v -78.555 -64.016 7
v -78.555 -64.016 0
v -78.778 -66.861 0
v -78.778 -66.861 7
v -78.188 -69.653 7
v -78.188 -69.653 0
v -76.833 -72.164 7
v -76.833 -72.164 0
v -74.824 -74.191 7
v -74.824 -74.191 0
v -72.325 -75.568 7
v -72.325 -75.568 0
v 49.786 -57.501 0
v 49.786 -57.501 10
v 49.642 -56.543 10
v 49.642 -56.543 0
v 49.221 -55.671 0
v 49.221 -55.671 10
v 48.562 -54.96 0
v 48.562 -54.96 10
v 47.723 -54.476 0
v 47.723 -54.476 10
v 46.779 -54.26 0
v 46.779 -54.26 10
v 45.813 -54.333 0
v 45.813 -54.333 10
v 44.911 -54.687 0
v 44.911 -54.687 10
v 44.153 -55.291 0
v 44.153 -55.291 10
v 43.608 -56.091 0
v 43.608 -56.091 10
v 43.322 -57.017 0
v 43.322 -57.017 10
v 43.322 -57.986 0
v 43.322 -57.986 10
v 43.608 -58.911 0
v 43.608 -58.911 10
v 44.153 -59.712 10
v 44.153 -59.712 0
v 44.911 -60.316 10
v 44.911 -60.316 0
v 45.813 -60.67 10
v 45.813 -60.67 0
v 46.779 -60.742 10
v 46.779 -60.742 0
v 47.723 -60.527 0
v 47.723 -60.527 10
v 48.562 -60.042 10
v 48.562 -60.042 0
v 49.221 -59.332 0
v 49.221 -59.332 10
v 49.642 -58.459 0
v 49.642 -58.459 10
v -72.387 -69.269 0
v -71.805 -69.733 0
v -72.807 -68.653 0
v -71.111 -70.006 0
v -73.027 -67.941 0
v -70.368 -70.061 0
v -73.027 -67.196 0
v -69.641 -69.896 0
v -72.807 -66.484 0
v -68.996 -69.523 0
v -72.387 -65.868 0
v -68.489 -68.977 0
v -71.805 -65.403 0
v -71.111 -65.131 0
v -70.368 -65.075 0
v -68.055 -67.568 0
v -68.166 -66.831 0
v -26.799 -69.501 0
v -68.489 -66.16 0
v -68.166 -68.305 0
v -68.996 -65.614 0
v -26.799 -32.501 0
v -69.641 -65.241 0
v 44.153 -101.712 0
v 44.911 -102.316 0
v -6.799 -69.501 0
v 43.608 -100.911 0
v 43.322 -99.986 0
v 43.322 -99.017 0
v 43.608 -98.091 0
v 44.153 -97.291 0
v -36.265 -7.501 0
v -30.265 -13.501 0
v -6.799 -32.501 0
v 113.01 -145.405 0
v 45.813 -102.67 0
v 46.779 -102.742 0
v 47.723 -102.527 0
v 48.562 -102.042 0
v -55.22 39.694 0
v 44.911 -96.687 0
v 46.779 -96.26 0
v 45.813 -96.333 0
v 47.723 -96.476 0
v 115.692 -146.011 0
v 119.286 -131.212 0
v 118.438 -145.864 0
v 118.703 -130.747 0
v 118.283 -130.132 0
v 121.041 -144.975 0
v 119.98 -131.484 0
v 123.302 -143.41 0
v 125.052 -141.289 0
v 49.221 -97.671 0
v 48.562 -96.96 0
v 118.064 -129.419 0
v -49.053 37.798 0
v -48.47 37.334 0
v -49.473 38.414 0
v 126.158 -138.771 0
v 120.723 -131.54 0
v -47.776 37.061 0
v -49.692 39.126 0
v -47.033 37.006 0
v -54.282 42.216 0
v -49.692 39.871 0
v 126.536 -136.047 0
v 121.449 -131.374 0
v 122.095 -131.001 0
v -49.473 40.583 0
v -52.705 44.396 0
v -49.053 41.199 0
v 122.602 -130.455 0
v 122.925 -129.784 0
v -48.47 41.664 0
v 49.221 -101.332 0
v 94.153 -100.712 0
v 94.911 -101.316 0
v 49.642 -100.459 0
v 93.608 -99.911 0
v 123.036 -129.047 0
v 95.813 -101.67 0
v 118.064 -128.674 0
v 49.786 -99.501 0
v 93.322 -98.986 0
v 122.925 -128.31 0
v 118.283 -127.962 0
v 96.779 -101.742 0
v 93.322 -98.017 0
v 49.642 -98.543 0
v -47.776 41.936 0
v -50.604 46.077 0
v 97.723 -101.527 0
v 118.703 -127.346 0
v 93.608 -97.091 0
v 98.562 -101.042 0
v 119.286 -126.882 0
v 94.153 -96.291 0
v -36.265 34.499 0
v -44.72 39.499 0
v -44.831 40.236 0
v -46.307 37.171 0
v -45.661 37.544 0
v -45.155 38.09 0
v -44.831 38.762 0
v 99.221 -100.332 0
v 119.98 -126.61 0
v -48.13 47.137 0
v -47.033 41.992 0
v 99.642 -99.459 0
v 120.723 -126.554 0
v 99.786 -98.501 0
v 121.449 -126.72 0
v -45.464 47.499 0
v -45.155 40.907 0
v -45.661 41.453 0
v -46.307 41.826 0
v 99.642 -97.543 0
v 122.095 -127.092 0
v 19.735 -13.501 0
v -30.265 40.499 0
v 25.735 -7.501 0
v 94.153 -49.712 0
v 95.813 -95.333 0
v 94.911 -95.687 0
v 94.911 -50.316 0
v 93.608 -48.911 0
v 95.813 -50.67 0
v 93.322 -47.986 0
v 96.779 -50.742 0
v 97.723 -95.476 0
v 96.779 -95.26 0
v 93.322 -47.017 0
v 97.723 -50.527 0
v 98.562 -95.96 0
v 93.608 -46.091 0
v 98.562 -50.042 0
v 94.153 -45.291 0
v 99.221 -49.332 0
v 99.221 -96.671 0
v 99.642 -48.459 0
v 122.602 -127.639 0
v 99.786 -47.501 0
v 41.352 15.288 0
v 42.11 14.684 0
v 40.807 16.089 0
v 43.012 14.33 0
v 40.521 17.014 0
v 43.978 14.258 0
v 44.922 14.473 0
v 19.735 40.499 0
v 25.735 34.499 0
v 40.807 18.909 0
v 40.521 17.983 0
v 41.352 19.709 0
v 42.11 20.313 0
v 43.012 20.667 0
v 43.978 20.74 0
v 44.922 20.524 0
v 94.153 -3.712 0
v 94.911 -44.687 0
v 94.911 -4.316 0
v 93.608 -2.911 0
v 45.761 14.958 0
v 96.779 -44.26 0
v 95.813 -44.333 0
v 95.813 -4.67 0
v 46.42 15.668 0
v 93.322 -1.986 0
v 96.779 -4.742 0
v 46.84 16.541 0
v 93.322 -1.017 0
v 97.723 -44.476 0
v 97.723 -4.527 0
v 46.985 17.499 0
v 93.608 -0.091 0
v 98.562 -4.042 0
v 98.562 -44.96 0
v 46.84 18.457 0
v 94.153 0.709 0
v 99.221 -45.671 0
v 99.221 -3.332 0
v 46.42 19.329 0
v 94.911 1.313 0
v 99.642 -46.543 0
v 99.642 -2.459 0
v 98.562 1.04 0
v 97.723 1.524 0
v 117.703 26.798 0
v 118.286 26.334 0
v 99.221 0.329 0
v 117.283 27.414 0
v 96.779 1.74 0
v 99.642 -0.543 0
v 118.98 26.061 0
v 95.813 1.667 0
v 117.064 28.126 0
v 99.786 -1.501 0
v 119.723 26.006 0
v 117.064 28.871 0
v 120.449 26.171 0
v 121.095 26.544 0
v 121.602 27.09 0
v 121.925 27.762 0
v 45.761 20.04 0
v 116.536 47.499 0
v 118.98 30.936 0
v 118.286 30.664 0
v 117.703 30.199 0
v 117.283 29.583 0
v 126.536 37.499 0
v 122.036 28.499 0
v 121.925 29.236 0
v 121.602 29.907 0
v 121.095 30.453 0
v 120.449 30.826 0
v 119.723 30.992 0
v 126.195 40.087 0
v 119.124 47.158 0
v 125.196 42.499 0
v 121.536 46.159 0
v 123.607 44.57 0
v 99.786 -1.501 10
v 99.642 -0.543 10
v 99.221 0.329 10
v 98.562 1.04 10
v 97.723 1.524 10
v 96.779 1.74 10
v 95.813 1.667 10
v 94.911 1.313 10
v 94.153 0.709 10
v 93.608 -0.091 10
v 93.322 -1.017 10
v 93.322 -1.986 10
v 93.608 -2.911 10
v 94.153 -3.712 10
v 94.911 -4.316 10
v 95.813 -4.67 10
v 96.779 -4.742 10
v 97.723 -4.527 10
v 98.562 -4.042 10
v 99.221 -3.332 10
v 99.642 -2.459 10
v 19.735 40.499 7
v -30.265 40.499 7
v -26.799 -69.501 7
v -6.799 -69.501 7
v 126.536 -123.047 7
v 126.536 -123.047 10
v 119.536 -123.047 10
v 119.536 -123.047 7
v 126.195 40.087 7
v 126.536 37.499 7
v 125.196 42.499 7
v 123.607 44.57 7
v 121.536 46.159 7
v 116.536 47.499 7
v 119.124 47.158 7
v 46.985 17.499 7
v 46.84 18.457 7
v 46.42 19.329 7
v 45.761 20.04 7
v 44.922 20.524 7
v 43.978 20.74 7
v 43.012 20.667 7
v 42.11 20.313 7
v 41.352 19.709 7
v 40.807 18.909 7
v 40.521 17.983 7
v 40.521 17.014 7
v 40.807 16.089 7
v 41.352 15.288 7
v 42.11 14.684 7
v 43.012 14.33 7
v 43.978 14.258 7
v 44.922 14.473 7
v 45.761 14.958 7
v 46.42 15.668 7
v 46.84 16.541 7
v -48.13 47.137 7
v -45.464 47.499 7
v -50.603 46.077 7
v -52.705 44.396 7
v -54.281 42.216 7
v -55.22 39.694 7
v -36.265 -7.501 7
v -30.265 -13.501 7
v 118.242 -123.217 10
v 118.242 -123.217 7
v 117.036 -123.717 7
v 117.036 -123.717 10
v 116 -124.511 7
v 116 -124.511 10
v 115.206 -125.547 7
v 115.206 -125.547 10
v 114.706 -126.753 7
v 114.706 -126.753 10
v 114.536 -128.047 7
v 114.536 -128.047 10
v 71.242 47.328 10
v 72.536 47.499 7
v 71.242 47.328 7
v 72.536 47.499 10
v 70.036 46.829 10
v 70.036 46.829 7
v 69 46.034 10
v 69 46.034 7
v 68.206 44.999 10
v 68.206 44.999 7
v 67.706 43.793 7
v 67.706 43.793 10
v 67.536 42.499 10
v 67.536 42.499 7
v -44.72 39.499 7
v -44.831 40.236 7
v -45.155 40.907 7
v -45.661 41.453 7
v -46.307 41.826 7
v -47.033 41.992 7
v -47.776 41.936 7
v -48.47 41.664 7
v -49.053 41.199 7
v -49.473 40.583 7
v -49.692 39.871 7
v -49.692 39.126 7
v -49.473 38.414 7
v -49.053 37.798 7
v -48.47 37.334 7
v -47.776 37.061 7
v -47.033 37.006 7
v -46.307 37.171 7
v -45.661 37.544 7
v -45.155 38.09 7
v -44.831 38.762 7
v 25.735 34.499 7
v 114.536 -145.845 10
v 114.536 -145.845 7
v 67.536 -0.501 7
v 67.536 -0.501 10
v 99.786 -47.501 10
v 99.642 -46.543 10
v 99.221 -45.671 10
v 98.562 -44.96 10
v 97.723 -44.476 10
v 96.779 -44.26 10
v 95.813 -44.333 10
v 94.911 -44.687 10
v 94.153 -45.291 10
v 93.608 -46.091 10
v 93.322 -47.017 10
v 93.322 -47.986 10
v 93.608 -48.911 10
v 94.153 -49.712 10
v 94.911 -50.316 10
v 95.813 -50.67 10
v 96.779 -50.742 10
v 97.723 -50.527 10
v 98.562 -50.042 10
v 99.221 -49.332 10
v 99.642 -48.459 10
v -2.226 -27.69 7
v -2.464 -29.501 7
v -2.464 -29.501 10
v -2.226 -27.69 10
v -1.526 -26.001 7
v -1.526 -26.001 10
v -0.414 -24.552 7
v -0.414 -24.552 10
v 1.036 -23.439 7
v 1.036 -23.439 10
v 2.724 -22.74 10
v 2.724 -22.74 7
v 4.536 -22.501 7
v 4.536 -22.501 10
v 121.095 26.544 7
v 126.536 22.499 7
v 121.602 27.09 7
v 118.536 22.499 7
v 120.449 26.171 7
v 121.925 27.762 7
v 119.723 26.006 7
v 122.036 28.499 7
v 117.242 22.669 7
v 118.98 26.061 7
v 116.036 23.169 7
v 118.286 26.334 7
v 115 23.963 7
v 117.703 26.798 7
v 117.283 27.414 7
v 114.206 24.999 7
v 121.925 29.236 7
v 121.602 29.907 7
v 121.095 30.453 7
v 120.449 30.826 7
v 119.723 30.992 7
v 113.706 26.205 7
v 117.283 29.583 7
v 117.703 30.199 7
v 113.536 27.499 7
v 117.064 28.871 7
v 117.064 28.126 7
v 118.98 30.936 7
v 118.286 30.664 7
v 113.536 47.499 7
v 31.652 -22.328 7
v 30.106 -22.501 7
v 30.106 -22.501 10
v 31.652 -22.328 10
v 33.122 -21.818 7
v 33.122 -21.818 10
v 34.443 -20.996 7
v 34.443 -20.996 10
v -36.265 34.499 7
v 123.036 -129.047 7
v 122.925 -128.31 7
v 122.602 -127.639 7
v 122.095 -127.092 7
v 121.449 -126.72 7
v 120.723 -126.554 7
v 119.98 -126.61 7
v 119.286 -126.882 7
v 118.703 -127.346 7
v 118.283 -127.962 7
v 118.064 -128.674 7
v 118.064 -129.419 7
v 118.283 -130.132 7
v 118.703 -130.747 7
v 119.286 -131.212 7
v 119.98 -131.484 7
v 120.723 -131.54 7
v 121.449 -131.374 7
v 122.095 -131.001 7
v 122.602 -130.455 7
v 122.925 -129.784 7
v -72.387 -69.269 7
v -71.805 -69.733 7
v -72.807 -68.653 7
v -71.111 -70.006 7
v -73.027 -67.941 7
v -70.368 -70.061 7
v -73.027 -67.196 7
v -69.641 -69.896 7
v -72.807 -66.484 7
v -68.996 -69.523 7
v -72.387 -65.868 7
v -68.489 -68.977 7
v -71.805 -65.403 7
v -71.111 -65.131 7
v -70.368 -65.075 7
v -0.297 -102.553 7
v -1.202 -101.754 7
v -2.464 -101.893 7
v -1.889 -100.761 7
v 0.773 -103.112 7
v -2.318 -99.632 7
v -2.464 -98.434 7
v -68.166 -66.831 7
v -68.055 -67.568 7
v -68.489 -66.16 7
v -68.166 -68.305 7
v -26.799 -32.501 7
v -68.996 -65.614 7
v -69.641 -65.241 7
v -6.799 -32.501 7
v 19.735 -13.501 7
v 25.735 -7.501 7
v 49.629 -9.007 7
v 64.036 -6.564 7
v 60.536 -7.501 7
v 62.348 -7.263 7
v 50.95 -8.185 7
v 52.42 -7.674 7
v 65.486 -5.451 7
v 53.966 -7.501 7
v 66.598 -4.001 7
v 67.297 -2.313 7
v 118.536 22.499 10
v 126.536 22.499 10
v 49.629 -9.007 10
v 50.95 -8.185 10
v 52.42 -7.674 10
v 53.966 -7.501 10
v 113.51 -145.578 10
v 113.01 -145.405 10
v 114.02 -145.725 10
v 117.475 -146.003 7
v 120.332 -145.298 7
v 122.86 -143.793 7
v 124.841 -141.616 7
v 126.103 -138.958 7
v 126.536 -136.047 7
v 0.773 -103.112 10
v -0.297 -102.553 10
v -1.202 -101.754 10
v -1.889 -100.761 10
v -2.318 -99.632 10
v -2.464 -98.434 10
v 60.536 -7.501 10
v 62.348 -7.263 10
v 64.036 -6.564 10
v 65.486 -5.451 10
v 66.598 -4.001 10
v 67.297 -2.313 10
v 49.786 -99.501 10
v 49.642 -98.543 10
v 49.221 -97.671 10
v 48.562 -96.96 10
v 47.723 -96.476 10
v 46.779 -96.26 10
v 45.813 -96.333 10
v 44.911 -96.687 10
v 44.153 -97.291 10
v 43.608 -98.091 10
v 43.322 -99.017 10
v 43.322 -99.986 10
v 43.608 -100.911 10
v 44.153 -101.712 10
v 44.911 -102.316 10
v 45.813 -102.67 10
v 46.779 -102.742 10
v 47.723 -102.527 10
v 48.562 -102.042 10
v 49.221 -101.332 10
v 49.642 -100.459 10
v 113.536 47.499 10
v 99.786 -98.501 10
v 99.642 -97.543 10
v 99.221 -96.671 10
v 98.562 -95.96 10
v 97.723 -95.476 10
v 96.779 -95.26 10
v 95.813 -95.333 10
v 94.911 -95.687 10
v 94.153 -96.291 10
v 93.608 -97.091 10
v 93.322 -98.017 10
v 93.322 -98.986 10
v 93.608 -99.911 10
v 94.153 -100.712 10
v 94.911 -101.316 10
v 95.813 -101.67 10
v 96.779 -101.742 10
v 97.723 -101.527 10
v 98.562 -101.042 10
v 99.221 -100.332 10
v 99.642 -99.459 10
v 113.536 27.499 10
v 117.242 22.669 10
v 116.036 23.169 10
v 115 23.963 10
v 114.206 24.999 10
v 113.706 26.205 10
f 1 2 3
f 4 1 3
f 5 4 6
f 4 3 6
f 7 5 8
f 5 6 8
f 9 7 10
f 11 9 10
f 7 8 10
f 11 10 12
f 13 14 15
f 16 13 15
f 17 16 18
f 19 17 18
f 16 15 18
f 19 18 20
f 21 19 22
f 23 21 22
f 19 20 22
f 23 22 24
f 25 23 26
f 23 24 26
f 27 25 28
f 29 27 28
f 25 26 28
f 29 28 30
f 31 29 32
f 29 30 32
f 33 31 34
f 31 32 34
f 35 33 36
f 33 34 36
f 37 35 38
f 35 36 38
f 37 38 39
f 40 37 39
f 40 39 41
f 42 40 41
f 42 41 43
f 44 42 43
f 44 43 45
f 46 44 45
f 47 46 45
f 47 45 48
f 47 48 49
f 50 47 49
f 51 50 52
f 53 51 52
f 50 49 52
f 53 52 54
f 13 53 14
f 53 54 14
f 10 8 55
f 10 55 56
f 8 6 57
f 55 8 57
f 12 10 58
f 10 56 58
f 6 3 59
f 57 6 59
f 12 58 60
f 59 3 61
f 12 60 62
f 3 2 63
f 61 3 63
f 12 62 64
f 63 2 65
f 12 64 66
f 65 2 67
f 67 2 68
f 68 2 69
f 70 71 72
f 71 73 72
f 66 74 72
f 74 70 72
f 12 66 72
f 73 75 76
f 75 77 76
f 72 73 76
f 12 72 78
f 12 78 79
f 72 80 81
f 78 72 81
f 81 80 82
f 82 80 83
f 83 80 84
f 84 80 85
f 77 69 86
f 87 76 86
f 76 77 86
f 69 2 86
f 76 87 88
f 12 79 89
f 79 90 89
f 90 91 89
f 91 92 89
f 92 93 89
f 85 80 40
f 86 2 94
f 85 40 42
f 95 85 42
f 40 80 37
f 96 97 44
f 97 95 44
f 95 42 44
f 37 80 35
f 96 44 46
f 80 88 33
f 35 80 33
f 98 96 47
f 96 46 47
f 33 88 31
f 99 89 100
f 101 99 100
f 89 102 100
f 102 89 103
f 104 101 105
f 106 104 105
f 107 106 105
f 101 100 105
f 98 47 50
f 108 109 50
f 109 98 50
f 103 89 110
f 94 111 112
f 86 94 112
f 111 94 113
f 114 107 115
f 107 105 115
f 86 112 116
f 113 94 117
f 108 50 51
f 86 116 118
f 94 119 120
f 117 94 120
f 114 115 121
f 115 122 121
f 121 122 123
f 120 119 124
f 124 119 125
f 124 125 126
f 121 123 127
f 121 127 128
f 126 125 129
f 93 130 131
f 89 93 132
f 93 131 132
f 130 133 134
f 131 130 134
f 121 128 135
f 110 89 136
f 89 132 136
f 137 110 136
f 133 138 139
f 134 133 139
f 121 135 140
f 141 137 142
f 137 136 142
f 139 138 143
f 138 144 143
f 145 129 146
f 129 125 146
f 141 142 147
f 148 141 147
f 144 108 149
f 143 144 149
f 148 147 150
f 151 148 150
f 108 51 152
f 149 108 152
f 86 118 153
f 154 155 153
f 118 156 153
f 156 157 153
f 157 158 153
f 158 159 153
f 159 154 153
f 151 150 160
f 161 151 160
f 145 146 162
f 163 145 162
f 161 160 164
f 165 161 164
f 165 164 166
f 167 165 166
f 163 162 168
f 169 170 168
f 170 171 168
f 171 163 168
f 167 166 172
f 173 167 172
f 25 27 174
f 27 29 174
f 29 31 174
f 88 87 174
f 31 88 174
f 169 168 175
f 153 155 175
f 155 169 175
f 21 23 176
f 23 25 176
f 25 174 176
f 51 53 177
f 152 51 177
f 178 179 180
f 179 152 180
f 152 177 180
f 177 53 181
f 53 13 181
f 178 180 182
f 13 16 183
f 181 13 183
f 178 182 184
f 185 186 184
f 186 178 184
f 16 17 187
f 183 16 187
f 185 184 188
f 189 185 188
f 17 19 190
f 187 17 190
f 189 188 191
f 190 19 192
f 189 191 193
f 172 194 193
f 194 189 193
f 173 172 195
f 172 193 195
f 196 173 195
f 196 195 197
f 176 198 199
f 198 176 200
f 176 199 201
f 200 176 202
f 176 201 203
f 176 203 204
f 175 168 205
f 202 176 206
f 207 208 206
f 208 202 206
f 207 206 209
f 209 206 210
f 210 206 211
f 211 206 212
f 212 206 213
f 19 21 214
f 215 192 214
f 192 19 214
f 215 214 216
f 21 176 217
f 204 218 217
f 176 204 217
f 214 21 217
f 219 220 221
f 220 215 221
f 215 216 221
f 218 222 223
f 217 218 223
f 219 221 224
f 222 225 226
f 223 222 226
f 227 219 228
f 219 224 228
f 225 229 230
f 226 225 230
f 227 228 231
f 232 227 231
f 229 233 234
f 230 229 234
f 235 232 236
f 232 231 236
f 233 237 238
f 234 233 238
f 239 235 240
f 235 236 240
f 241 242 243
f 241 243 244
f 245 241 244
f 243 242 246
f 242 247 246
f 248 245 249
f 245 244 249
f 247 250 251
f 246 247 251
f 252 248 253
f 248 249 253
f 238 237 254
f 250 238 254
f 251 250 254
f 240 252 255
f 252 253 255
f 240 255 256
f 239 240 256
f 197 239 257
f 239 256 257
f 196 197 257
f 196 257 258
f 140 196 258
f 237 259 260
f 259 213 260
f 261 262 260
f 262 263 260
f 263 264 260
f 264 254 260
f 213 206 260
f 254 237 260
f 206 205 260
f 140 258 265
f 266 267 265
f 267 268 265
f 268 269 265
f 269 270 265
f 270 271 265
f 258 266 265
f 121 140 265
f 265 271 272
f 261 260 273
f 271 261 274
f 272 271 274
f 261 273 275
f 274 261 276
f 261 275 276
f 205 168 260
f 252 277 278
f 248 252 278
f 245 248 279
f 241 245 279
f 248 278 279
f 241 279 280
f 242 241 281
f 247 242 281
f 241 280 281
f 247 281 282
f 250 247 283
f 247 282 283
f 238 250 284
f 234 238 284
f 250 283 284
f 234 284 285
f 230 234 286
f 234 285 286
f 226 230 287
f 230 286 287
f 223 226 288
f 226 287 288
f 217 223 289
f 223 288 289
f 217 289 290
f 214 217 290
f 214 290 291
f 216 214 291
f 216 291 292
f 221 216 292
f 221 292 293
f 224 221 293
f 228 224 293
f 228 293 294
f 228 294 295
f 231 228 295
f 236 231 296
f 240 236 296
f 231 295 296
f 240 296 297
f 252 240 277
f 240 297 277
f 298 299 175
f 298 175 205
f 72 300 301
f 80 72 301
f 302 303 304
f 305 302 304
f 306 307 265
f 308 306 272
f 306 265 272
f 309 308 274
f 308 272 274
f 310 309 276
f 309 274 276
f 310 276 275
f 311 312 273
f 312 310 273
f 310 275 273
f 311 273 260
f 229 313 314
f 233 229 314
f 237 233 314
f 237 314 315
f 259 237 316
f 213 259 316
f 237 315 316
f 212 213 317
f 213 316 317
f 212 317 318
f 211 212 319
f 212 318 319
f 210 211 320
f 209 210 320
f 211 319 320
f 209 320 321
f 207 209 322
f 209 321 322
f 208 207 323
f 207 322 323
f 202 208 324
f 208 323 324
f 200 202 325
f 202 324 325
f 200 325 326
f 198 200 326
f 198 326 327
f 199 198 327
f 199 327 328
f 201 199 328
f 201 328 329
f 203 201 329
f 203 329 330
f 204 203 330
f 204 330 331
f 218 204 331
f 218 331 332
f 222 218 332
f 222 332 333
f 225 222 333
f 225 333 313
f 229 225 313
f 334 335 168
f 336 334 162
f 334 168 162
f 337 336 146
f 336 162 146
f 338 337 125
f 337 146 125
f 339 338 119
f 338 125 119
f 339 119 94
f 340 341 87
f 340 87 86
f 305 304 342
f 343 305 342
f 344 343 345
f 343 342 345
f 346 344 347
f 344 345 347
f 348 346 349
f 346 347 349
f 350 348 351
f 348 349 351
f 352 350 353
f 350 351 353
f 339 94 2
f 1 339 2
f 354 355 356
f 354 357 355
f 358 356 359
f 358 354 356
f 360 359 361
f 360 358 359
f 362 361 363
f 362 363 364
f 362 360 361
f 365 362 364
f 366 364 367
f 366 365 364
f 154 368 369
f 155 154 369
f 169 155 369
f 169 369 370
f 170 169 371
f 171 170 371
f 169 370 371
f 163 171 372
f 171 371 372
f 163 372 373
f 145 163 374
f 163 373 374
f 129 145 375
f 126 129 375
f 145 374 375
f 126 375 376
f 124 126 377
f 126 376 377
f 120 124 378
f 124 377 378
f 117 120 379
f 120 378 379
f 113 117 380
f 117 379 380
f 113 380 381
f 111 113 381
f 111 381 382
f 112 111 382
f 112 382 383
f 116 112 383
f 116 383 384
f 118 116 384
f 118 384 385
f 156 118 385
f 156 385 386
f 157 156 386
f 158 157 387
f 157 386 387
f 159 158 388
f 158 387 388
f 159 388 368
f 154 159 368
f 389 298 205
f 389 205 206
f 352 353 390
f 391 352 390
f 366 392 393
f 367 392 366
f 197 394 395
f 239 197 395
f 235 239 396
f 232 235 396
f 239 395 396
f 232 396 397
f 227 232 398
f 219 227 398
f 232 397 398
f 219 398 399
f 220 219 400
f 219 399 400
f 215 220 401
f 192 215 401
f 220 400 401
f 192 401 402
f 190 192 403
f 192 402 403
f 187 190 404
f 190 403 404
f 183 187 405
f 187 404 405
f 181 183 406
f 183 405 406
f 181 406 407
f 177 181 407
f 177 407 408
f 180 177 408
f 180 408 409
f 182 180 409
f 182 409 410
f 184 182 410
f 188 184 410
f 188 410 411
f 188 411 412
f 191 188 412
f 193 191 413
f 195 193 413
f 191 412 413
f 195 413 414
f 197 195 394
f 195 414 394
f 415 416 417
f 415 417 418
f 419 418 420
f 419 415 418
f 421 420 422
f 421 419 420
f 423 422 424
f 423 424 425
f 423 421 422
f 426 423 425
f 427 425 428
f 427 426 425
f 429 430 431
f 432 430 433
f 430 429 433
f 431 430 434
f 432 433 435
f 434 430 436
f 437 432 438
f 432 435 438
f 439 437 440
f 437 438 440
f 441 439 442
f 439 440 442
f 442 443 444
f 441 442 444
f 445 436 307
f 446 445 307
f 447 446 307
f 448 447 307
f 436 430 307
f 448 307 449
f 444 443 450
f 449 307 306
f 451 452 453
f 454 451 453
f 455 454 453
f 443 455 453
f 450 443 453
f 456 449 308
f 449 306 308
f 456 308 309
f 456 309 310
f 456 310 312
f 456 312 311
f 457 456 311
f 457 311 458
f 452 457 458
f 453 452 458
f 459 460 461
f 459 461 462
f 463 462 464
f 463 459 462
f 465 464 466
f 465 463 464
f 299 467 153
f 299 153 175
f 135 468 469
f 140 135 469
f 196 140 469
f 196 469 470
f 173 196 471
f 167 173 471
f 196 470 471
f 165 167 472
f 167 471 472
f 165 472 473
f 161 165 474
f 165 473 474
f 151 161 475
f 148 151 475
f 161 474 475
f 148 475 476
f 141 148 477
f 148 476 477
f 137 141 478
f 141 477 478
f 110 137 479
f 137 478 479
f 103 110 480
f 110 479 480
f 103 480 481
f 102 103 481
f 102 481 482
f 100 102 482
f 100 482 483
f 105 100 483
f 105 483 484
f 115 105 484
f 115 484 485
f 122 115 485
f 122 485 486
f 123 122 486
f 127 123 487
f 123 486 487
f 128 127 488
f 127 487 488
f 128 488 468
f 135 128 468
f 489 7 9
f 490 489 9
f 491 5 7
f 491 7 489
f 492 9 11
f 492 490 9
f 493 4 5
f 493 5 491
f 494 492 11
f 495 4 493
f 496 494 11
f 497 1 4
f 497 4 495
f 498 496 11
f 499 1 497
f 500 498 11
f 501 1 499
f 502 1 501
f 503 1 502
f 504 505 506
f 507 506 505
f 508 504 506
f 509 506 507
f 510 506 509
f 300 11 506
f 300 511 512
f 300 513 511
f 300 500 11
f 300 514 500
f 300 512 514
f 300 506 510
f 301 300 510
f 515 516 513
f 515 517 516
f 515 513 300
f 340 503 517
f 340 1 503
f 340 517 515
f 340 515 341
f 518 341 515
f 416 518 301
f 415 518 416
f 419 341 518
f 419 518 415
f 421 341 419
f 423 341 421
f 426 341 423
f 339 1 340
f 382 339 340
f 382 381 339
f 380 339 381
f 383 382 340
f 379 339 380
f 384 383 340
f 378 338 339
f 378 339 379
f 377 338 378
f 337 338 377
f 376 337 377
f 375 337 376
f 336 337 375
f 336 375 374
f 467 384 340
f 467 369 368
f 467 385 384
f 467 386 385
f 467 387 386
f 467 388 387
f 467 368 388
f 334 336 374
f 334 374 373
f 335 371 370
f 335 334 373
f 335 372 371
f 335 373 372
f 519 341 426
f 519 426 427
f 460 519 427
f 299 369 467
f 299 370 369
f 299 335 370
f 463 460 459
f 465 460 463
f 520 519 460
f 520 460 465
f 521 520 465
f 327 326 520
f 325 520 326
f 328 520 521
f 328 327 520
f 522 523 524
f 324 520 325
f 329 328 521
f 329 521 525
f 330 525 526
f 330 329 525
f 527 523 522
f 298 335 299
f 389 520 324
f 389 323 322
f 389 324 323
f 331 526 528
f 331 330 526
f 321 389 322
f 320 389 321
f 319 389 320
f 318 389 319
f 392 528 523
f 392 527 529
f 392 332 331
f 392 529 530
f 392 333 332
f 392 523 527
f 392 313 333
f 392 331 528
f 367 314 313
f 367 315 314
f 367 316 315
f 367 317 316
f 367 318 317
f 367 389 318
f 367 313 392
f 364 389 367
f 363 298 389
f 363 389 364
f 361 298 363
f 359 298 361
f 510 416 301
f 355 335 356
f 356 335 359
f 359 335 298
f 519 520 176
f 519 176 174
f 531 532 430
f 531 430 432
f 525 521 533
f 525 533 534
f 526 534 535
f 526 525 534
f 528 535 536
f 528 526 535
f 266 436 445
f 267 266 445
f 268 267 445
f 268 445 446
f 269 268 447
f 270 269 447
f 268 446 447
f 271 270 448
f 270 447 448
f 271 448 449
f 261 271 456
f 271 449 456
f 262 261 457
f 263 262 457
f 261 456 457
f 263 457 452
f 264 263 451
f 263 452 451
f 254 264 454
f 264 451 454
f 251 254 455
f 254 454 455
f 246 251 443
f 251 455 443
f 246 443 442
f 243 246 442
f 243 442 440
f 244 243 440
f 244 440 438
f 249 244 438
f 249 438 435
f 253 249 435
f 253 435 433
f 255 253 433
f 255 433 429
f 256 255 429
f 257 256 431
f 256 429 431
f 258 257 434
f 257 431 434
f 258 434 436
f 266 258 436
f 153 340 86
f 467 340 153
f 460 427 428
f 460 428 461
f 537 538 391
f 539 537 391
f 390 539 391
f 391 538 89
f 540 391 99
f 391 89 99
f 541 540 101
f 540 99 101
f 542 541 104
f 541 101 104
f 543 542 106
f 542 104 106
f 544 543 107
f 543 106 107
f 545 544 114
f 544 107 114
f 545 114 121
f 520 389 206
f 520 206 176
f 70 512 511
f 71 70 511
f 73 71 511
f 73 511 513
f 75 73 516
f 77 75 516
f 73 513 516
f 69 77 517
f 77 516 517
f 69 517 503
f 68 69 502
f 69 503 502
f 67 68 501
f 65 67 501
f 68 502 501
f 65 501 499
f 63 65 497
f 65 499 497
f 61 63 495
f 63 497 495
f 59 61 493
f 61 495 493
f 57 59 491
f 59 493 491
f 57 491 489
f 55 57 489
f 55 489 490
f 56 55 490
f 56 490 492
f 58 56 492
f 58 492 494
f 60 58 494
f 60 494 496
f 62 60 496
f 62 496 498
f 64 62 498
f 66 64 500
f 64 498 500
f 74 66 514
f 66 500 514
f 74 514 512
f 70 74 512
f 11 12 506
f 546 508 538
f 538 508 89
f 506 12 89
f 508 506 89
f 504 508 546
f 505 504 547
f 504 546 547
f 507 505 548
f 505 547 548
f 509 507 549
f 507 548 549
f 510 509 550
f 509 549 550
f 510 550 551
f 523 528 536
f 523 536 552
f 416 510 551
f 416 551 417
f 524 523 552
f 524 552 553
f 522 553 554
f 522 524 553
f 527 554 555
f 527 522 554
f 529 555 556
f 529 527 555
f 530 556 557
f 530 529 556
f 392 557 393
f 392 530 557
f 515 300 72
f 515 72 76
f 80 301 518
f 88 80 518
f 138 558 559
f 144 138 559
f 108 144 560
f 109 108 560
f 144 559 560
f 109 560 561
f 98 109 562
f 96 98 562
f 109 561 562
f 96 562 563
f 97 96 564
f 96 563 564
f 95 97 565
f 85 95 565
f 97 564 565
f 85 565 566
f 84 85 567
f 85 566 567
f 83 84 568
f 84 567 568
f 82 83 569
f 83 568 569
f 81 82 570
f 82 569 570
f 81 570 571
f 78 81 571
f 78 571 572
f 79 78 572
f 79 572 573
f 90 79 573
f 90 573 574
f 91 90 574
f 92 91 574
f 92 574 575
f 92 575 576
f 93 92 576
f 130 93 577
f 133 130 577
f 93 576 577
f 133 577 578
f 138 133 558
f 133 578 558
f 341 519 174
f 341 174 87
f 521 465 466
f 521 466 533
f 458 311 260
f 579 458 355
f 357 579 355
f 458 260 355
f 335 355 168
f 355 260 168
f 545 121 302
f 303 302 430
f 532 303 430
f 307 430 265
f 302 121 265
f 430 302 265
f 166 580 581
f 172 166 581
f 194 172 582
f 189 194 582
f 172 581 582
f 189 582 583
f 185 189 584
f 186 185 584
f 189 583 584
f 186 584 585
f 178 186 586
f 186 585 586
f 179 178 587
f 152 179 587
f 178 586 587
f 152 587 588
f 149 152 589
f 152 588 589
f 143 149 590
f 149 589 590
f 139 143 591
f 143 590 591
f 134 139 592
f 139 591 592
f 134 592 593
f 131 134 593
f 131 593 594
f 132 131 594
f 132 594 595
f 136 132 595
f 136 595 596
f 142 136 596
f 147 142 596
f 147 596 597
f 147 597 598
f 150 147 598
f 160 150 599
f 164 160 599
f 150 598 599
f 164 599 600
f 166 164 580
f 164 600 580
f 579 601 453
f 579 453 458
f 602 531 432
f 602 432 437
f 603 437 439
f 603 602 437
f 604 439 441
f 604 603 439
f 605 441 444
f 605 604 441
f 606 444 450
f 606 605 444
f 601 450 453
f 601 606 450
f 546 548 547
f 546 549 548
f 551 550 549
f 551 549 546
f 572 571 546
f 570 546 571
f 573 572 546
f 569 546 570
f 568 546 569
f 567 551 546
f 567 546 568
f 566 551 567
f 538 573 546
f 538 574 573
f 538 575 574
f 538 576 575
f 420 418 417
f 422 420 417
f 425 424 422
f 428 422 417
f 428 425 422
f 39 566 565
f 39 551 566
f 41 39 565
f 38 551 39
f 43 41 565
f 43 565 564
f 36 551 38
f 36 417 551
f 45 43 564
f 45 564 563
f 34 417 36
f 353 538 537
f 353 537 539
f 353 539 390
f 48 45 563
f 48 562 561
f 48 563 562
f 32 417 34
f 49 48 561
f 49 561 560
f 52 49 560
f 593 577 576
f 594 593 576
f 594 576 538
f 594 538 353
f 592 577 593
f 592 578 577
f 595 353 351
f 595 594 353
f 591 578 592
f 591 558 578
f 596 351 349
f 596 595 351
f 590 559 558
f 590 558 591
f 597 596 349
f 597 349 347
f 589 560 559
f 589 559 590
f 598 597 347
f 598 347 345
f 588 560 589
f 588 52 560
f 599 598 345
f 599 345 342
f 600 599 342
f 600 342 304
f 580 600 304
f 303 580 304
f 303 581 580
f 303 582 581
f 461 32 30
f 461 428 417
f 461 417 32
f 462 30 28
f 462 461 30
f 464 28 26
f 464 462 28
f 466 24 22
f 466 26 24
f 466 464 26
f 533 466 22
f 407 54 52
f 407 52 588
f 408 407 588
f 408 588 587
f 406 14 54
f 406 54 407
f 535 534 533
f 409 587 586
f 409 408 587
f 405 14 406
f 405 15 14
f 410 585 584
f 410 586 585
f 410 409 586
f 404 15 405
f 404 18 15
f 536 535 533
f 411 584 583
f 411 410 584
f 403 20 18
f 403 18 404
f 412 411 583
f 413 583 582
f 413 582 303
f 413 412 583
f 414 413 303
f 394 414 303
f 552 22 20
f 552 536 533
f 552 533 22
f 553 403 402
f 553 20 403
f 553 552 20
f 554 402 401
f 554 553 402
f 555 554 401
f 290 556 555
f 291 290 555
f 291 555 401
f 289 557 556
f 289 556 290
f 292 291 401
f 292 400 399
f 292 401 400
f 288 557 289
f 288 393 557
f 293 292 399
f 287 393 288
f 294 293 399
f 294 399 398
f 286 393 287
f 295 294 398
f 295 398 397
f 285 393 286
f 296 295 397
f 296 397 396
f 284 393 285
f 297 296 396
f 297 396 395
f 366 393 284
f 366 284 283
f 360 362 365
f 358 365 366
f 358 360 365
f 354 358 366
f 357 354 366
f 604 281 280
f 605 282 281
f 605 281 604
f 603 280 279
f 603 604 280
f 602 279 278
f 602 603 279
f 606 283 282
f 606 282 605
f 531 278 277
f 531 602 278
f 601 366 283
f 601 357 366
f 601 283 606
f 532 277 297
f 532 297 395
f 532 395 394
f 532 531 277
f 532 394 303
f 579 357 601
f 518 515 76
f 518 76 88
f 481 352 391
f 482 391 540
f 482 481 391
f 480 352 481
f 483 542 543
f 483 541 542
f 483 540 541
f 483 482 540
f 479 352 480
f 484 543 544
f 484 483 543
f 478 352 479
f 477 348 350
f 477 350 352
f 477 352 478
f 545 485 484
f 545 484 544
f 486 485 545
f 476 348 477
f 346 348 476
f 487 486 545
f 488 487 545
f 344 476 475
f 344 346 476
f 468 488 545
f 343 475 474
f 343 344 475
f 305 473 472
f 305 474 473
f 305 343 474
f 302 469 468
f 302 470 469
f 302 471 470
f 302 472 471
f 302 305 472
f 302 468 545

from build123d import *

# Parameters (mm, degrees)
BOSS_EXTRUDE1_DEPTH = 10
SKETCH2_R           = 3.25
SKETCH2_W           = 20
SKETCH2_H           = 37
CUT_EXTRUDE1_DEPTH  = 10
CUT_EXTRUDE2_START  = -3
SKETCH3_W           = 20
SKETCH3_H           = 37
SKETCH3_R           = 3.25
CUT_EXTRUDE2_DEPTH  = 3
FILLET1_R           = 5
CUT_EXTRUDE3_DEPTH  = 3
SKETCH5_R           = 2.5
CUT_EXTRUDE4_DEPTH  = 7


with BuildPart() as part:
    # Sketch1 → Boss-Extrude1 (new body)
    with BuildSketch(Plane.XY):
        with BuildLine():
            Line((-72.324772809, -75.56835732), (113.0098159, -145.404579152))
            ThreePointArc((113.0098159, -145.404579152), (122.225331612, -144.27064673), (126.535908242, -136.046872553))
            Line((126.535908242, -136.046872553), (126.535908242, 37.498632429))
            ThreePointArc((126.535908242, 37.498632429), (123.606976053, 44.569700241), (116.535908242, 47.498632429))
            Line((116.535908242, 47.498632429), (-45.464091758, 47.498632429))
            ThreePointArc((-45.464091758, 47.498632429), (-51.711042234, 45.307320523), (-55.220189319, 39.69375438))
            Line((-55.220189319, 39.69375438), (-78.554778028, -64.01552877))
            ThreePointArc((-78.554778028, -64.01552877), (-77.600447564, -70.957112136), (-72.324772809, -75.56835732))
        make_face()
    extrude(amount=BOSS_EXTRUDE1_DEPTH)

    # Sketch2 → Cut-Extrude1 (cut)
    with BuildSketch(Plane.XY.offset(10)):
        with Locations((43.734834886, 17.498632429)):
            Circle(SKETCH2_R)
        with Locations((96.535908242, -1.501367571)):
            Circle(SKETCH2_R)
        with Locations((96.535908242, -47.501367571)):
            Circle(SKETCH2_R)
        with Locations((96.535908242, -98.501367571)):
            Circle(SKETCH2_R)
        with Locations((46.535908242, -57.501367571)):
            Circle(SKETCH2_R)
        with Locations((46.535908242, -99.501367571)):
            Circle(SKETCH2_R)
        with Locations((-16.798680467, -51.001367571)):
            Rectangle(SKETCH2_W, SKETCH2_H)
        Polygon((-30.265165114, 40.498632429), (19.734834886, 40.498632429), (25.734834886, 34.498632429), (25.734834886, -7.501367571), (19.734834886, -13.501367571), (-30.265165114, -13.501367571), (-36.265165114, -7.501367571), (-36.265165114, 34.498632429), align=None)
    extrude(amount=-CUT_EXTRUDE1_DEPTH, mode=Mode.SUBTRACT)

    # Sketch3 → Cut-Extrude2 (cut)
    with BuildSketch(Plane.XY.offset(10).offset(CUT_EXTRUDE2_START)):
        with BuildLine():
            Line((-72.324772809, -75.56835732), (-2.464091758, -101.892671919))
            Line((-2.464091758, -101.892671919), (-2.464091758, -29.501367571))
            ThreePointArc((-2.464091758, -29.501367571), (-0.413839227, -24.551620103), (4.535908242, -22.501367571))
            Line((4.535908242, -22.501367571), (30.105771034, -22.501367571))
            ThreePointArc((30.105771034, -22.501367571), (32.401500165, -22.114205672), (34.443281054, -20.99554693))
            Line((34.443281054, -20.99554693), (49.628535429, -9.007188212))
            ThreePointArc((49.628535429, -9.007188212), (51.670316318, -7.88852947), (53.966045449, -7.501367571))
            Line((53.966045449, -7.501367571), (60.535908242, -7.501367571))
            ThreePointArc((60.535908242, -7.501367571), (65.48565571, -5.451115039), (67.535908242, -0.501367571))
            Line((67.535908242, -0.501367571), (67.535908242, 47.498632429))
            Line((67.535908242, 47.498632429), (-45.464091733, 47.498632429))
            ThreePointArc((-45.464091733, 47.498632429), (-51.710766684, 45.307540935), (-55.220034365, 39.69444284))
            Line((-55.220034365, 39.69444284), (-55.220189319, 39.69375438))
            Line((-55.220189319, 39.69375438), (-78.554778028, -64.01552877))
            ThreePointArc((-78.554778028, -64.01552877), (-77.600447564, -70.957112136), (-72.324772809, -75.56835732))
        make_face()
        with Locations((-16.798680467, -51.001367571)):
            Rectangle(SKETCH3_W, SKETCH3_H, mode=Mode.SUBTRACT)
        Polygon((-30.265165114, -13.501367571), (-36.265165114, -7.501367571), (-36.265165114, 34.498632429), (-30.265165114, 40.498632429), (19.734834886, 40.498632429), (25.734834886, 34.498632429), (25.734834886, -7.501367571), (19.734834886, -13.501367571), align=None, mode=Mode.SUBTRACT)
        with Locations((43.734834886, 17.498632429)):
            Circle(SKETCH3_R, mode=Mode.SUBTRACT)
    extrude(amount=CUT_EXTRUDE2_DEPTH, mode=Mode.SUBTRACT)

    # Fillet1
    fillet1_edges = [part.edges().sort_by_distance(p)[0] for p in [
        (-2.464091758, -101.892671919, 8.5),
        (67.535908242, 47.498632429, 8.5),
    ]]
    fillet(fillet1_edges, radius=FILLET1_R)

    # Sketch4 → Cut-Extrude3 (cut)
    with BuildSketch(Plane.XY.offset(10)):
        with BuildLine():
            Line((126.535908242, 22.498632429), (118.535908242, 22.498632429))
            ThreePointArc((118.535908242, 22.498632429), (115.000374336, 23.963098523), (113.535908242, 27.498632429))
            Line((113.535908242, 27.498632429), (113.535908242, 47.498632429))
            Line((113.535908242, 47.498632429), (126.535908242, 47.498632429))
            Line((126.535908242, 47.498632429), (126.535908242, 22.498632429))
        make_face()
        with BuildLine():
            Line((126.535908242, -123.046872553), (119.535908242, -123.046872553))
            ThreePointArc((119.535908242, -123.046872553), (116.000374336, -124.511338647), (114.535908242, -128.046872553))
            Line((114.535908242, -128.046872553), (114.535908242, -146.046872553))
            Line((114.535908242, -146.046872553), (126.535908242, -146.046872553))
            Line((126.535908242, -146.046872553), (126.535908242, -123.046872553))
        make_face()
    extrude(amount=-CUT_EXTRUDE3_DEPTH, mode=Mode.SUBTRACT)

    # Sketch5 → Cut-Extrude4 (cut)
    with BuildSketch(Plane.XY.offset(7)):
        with Locations((120.535908242, -129.046872553)):
            Circle(SKETCH5_R)
        with Locations((119.535908242, 28.498632429)):
            Circle(SKETCH5_R)
        with Locations((-47.220189319, 39.498632429)):
            Circle(SKETCH5_R)
        with Locations((-70.554778028, -67.56835732)):
            Circle(SKETCH5_R)
    extrude(amount=-CUT_EXTRUDE4_DEPTH, mode=Mode.SUBTRACT)


solid = part.part
